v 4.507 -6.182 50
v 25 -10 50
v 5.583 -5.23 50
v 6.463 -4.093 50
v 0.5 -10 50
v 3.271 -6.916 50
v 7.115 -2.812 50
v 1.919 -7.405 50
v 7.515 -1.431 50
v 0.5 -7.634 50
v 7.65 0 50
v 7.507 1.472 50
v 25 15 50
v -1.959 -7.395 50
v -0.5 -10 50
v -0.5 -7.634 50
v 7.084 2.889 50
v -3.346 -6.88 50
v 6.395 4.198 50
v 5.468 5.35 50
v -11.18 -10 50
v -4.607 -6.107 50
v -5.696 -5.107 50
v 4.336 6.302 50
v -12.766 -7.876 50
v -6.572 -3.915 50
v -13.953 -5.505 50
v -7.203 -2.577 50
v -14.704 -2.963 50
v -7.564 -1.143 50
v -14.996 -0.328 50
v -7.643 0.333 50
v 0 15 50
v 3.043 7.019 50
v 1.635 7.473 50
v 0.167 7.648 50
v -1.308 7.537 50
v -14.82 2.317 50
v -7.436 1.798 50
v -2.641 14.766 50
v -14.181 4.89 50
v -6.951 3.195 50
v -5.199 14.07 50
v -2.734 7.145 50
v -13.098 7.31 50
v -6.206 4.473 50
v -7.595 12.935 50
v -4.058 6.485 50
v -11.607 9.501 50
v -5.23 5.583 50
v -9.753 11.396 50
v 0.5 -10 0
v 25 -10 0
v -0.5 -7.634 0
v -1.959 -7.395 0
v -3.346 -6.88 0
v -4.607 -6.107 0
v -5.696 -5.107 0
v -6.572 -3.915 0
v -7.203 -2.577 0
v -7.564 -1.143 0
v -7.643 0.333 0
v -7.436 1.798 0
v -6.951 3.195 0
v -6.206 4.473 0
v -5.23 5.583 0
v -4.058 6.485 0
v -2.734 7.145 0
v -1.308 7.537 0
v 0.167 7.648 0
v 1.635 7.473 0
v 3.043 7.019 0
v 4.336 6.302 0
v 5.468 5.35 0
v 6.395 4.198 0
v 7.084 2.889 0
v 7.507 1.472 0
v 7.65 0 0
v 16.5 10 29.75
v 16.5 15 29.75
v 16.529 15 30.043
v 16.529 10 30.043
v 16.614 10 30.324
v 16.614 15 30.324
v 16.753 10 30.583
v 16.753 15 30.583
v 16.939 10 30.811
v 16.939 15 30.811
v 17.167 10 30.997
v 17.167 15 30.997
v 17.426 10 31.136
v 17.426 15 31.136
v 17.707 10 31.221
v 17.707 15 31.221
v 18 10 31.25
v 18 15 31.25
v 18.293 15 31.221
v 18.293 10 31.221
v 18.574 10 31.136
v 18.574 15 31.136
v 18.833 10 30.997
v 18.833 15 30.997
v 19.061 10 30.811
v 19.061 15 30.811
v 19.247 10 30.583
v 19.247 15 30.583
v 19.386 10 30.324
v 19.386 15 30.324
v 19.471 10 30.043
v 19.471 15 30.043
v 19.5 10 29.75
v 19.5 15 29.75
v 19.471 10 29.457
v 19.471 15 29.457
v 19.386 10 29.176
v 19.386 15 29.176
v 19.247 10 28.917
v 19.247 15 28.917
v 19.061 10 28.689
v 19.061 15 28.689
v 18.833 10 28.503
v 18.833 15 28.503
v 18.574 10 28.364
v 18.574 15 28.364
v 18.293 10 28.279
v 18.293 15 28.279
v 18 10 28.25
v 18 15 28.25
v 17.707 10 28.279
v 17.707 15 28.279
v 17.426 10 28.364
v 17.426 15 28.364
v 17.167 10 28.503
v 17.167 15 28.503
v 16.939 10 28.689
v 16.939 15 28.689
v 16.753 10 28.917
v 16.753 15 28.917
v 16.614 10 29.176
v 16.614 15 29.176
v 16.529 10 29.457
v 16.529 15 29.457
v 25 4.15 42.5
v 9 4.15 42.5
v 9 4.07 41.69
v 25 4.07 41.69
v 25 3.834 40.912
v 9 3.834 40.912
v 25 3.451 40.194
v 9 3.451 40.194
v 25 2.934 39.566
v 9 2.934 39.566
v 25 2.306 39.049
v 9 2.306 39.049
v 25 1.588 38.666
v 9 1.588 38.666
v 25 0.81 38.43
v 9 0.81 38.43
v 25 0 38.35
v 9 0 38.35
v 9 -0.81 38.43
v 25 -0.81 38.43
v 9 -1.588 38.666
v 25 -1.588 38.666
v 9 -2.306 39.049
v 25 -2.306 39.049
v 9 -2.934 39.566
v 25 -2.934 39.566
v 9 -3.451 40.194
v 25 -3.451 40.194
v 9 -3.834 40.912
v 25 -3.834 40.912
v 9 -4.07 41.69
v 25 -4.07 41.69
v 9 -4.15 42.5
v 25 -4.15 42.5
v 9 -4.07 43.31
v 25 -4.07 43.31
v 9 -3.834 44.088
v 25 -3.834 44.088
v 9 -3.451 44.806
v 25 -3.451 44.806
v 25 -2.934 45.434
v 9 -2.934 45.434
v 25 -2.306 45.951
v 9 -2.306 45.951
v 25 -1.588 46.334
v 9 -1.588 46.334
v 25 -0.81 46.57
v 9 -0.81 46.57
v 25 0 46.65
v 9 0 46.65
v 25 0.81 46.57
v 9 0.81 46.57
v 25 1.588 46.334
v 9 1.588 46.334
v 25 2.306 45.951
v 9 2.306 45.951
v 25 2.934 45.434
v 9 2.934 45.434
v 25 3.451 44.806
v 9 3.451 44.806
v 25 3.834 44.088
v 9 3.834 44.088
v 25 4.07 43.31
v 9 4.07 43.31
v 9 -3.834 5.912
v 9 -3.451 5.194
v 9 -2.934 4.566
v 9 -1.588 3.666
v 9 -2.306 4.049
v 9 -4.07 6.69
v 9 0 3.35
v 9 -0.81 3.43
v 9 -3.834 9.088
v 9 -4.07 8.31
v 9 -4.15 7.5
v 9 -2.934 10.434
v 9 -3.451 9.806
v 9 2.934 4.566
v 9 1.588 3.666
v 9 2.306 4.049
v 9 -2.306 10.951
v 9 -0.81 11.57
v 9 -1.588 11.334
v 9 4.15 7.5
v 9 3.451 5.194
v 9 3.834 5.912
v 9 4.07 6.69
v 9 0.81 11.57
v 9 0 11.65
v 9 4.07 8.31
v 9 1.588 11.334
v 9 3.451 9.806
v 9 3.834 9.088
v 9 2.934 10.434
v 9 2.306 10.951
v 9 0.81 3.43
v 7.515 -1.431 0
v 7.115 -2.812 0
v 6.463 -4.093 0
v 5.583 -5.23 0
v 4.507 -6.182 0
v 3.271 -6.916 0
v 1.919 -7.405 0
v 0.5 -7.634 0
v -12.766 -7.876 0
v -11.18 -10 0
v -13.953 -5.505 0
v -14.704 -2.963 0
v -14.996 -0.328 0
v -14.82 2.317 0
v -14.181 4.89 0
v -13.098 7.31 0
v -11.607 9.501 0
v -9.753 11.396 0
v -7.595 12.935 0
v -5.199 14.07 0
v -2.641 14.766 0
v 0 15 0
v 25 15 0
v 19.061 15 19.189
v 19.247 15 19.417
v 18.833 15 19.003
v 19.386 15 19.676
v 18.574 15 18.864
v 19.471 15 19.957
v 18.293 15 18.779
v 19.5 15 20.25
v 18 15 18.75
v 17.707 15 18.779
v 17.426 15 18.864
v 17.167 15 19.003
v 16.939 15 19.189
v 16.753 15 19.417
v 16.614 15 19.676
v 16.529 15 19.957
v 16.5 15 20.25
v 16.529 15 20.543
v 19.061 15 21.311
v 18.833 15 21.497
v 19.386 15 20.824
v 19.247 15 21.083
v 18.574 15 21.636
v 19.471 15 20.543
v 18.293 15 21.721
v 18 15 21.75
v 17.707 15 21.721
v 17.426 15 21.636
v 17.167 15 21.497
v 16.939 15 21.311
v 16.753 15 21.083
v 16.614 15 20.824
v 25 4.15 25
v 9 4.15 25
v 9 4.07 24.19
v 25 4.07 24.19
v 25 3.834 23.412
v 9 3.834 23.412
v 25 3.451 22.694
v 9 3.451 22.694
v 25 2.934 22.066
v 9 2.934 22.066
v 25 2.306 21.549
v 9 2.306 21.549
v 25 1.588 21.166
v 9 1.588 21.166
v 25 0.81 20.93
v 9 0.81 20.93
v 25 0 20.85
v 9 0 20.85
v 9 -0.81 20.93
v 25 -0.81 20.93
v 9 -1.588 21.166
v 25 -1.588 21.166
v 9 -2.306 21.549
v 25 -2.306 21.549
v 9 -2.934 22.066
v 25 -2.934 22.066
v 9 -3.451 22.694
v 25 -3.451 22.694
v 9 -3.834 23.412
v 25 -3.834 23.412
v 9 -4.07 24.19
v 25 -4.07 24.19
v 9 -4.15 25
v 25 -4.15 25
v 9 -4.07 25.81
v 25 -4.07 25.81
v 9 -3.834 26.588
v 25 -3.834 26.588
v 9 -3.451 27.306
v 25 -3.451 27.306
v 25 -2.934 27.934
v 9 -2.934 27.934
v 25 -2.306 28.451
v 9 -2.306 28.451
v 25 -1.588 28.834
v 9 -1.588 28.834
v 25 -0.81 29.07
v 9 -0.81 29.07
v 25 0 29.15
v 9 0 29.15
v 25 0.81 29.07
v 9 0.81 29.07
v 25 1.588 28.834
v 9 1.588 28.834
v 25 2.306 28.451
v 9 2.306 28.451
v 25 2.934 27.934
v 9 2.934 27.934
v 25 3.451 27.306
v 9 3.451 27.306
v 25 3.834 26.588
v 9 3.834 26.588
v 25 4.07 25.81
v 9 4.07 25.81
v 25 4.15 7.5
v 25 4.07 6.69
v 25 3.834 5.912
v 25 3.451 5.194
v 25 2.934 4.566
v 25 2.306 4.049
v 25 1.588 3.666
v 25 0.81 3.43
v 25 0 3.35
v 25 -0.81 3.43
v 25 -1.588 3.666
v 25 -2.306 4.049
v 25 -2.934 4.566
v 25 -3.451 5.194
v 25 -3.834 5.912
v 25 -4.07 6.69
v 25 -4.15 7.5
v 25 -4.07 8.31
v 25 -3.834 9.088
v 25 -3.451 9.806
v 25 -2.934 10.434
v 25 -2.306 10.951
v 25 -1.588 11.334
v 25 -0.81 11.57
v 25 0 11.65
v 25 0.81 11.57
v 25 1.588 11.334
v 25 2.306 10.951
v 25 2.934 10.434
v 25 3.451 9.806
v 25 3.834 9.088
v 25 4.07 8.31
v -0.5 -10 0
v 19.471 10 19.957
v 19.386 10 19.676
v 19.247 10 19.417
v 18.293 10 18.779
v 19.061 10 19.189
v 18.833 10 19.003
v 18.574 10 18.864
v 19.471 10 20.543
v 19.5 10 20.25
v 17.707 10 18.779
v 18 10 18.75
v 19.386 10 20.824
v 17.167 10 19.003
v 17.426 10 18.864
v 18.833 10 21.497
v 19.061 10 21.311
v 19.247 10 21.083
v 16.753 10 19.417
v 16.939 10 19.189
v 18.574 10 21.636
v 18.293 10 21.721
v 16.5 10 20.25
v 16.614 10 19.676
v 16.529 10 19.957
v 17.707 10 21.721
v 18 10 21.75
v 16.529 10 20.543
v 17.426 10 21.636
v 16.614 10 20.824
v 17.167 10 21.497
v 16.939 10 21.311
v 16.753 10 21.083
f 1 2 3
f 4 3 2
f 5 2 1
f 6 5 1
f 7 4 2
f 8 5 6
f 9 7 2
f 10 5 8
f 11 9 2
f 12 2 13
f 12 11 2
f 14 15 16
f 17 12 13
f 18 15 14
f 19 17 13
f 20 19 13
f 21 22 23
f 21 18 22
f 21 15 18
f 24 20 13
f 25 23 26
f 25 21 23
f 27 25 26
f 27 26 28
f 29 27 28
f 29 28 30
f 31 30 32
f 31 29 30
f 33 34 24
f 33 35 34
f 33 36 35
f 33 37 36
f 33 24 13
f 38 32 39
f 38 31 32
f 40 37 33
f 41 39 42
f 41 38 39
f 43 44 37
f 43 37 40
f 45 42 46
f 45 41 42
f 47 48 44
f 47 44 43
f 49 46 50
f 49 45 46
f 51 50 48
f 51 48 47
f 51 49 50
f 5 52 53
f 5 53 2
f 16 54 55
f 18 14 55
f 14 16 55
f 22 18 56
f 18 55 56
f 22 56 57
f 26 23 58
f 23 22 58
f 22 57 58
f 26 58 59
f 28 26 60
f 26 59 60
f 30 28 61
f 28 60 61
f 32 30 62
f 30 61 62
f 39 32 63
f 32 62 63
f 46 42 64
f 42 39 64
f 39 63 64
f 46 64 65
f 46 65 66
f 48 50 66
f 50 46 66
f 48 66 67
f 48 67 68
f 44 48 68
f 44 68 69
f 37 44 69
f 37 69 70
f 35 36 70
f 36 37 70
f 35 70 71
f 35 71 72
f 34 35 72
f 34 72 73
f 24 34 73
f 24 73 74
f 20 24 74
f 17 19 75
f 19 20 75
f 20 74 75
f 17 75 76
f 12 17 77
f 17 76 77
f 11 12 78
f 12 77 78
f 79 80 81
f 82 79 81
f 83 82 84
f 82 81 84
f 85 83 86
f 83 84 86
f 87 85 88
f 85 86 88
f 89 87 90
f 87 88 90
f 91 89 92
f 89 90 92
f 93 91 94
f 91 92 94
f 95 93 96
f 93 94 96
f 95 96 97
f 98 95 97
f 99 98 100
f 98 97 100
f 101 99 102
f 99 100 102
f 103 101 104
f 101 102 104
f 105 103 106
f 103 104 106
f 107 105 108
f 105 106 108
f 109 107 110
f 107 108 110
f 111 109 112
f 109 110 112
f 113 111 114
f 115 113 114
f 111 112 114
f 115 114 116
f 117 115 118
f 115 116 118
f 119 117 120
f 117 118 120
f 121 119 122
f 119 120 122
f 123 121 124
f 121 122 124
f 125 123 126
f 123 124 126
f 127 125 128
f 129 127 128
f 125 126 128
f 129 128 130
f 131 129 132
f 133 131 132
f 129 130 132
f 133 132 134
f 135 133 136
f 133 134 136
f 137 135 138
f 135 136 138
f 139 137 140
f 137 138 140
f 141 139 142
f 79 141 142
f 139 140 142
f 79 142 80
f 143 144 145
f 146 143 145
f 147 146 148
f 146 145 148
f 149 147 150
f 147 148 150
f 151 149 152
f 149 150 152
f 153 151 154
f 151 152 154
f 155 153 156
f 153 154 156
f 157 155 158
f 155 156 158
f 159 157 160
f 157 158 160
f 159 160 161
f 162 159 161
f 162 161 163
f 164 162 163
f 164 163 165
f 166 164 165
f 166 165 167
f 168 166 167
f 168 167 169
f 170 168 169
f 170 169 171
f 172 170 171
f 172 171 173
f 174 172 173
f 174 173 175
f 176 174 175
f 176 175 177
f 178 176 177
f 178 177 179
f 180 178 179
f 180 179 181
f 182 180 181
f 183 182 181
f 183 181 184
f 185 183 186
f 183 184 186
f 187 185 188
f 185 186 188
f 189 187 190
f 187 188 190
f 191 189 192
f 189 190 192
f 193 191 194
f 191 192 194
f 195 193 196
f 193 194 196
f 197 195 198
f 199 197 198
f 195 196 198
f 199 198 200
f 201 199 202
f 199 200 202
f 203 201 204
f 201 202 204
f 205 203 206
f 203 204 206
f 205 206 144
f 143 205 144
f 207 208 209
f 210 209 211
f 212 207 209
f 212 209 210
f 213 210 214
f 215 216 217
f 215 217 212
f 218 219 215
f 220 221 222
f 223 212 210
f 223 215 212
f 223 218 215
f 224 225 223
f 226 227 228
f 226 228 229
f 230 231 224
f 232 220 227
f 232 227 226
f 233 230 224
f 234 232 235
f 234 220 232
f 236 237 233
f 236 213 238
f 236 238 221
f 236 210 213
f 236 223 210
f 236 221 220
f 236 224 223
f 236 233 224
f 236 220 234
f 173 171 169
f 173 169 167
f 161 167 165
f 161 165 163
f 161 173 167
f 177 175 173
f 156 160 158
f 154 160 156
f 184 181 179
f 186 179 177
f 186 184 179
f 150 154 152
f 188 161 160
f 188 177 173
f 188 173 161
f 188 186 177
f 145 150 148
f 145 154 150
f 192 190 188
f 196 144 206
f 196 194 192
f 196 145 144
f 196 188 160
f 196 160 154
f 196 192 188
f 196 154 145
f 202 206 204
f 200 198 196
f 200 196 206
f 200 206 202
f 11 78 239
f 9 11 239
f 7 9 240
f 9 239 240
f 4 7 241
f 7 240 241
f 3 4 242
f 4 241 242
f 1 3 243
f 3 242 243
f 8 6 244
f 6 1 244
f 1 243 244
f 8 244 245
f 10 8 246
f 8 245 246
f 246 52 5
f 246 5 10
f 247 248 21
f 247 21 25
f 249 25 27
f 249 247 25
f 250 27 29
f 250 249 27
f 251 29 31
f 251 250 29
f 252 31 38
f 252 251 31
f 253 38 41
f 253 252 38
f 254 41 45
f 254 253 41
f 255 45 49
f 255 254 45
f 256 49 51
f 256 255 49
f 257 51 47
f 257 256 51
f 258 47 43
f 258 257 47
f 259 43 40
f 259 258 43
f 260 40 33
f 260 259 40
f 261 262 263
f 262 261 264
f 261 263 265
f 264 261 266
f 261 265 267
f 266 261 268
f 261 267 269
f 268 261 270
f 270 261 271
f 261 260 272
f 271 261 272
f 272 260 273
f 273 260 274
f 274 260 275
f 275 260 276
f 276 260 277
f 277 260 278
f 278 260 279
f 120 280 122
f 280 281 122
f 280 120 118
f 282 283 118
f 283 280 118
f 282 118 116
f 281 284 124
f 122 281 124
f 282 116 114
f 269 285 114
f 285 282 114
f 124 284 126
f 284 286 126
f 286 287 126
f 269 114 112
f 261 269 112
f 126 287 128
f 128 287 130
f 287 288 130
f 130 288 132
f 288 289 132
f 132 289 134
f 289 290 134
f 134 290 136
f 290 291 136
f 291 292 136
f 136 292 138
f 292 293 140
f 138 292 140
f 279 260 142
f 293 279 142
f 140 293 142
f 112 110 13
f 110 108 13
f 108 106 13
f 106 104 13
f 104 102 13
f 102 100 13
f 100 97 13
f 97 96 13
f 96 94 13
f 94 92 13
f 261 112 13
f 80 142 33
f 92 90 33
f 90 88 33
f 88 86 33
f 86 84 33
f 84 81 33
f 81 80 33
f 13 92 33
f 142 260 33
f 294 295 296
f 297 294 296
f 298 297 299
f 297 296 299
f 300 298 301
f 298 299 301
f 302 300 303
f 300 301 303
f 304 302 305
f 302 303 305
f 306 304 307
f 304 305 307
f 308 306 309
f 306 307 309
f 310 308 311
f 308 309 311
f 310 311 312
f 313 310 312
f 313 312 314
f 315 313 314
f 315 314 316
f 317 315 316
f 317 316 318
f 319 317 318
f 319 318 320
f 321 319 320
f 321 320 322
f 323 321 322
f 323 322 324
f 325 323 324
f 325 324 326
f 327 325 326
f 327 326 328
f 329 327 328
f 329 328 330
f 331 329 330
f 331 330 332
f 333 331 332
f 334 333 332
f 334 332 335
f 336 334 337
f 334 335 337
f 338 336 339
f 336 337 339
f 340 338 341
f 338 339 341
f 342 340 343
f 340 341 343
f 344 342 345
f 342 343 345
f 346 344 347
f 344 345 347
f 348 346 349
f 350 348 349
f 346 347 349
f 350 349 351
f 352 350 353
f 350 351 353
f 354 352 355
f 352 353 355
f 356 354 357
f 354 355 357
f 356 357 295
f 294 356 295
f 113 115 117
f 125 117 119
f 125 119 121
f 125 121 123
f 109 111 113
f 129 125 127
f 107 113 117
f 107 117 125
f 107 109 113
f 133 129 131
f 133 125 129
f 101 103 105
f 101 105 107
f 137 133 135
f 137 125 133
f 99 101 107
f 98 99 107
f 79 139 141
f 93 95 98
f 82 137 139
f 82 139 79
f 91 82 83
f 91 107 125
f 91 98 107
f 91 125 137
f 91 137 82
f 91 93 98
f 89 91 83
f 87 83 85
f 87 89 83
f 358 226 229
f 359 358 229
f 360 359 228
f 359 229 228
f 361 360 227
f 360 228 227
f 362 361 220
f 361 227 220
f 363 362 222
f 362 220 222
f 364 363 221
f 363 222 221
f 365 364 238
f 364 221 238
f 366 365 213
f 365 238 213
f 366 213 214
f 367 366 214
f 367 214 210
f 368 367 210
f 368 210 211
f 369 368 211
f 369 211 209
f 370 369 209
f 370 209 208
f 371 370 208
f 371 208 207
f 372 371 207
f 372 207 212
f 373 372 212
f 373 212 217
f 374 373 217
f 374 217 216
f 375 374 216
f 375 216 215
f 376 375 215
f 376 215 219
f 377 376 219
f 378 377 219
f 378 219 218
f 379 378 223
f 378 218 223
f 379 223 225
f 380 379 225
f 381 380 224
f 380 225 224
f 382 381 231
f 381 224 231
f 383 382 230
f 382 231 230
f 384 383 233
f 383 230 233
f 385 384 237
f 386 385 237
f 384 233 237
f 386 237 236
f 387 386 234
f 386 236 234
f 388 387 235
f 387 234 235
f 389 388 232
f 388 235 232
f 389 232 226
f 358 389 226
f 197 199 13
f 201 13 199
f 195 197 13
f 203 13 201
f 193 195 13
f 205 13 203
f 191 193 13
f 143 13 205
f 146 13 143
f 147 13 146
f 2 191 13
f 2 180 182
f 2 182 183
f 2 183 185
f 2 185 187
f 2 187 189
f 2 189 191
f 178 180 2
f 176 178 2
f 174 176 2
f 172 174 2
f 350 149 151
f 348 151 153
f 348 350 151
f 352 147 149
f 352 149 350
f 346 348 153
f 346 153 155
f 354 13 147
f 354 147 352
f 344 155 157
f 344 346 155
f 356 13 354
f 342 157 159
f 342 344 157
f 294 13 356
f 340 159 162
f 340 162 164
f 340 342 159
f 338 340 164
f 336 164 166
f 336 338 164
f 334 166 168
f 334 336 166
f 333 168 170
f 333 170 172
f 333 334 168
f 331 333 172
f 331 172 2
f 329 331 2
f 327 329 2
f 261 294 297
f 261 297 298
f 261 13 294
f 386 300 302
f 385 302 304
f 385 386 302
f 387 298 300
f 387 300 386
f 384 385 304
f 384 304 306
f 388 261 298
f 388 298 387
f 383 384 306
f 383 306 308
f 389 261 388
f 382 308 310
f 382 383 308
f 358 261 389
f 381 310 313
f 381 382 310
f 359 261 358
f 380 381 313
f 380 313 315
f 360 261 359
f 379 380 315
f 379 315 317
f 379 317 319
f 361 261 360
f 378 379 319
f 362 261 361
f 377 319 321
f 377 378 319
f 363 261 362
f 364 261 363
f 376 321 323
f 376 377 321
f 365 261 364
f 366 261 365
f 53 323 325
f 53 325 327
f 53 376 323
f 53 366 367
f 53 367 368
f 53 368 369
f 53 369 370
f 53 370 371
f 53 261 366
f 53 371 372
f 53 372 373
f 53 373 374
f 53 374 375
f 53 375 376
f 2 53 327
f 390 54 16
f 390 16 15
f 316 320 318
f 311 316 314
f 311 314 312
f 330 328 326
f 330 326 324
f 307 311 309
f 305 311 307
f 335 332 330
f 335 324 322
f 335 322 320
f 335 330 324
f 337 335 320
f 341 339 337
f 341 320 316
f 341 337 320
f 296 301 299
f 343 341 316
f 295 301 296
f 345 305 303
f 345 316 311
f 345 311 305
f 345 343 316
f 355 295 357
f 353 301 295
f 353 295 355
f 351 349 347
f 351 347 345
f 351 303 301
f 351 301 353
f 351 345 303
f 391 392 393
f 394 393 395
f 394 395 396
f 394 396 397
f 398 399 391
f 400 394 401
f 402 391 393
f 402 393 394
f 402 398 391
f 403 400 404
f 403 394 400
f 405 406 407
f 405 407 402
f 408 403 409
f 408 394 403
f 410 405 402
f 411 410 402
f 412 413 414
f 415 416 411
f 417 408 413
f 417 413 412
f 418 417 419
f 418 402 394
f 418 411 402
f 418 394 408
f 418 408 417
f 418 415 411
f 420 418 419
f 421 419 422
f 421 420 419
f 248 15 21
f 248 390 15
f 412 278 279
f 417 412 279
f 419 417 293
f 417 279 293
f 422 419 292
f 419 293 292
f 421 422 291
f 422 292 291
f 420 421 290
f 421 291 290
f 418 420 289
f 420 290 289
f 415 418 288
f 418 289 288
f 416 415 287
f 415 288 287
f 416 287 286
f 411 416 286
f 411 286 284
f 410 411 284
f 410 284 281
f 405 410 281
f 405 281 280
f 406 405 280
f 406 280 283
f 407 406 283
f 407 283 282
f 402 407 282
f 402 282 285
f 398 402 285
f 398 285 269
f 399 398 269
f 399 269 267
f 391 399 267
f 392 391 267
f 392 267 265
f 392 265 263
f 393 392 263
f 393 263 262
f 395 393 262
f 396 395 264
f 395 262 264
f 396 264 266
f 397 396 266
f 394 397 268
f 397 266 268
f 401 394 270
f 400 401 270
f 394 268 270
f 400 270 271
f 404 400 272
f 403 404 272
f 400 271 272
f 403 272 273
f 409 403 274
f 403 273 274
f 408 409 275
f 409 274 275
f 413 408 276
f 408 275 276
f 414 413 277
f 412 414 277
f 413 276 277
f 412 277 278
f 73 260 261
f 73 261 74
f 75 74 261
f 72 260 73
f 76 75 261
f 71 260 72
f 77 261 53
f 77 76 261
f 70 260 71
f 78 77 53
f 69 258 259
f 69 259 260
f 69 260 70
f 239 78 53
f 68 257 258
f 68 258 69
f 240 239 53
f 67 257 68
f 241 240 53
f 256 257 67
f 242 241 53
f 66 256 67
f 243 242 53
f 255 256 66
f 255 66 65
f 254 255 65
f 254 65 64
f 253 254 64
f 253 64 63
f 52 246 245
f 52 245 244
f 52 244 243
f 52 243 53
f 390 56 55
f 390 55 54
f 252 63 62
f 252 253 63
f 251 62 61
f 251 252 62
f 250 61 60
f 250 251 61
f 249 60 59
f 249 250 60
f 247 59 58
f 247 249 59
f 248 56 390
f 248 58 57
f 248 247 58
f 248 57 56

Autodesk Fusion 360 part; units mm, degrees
sketch "Skizze1" plane through (0, 0, 0) normal (0, 0, 1) x (1, 0, 0)
  circle A0 centre (0, 0) radius 7.65
  line L0 (15, -10) -> (-15, -10)
  line L1 (-15, -10) -> (-15, 15)
  line L2 (-15, 15) -> (15, 15)
  line L3 (15, 15) -> (15, -10)
  line L4 (0, 0) -> (0, -10)
  line L5 (0, -10) -> (-0.5, -10)
  line L6 (-0.5, -10) -> (0.5, -10)
  line L7 (0.5, -10) -> (0.5, -7.3)
  line L8 (0.5, -7.3) -> (-0.5, -7.3)
  line L9 (-0.5, -7.3) -> (-0.5, -10)
  circle A1 centre (0, 0) radius 15
  dimension "d1" = 15.3
  dimension "d4" = 15
  dimension "d5" = 10
  dimension "d6" = 15
  dimension "d7" = 25
extrude "Extrusion1" add sketch "Skizze1" along normal blind 50 contours A0 L0 L7 L9 A1 | L0 L3 A1 | L2 L3 A1
sketch "Skizze2" plane through (15, 0, 0) normal (1, 0, 0) x (0, 1, 0)
  line L0 (-10, 0) -> (15, 0)
  line L1 (15, 0) -> (15, 50)
  line L2 (15, 50) -> (-10, 50)
  line L3 (-10, 50) -> (-10, 0)
  line L4 (-10, 25) -> (15, 25)
  circle A0 centre (0, 25) radius 4.15
  line L5 (0, 25) -> (0, 42.5)
  line L6 (0, 25) -> (0, 7.5)
  circle A1 centre (0, 42.5) radius 4.15
  circle A2 centre (0, 7.5) radius 4.15
  dimension "d10" = 8.3
  dimension "d11" = 10
  dimension "d22" = 17.5
  dimension "d23" = 8.3
  dimension "d24" = 8.3
  dimension "d25" = 17.5
extrude "Extrusion2" cut sketch "Skizze2" against normal blind 6 contours A2 | A1 | L4 A0 L5 | L4 A0 L6 | L4 A0 L6 | L4 A0 L5
extrude "Extrusion4" add 1 faces at (15, 11.3833, 25) along direction (1, 0, 0) blind 10
sketch "Skizze3" plane through (0, 15, 0) normal (0, 1, 0) x (-1, 0, 0)
  line L0 (-25, 0) -> (0, 0)
  line L1 (0, 50) -> (-25, 50)
  line L2 (-25, 25) -> (-18, 25)
  line L3 (-18, 25) -> (-18, 20.25)
  line L4 (-18, 25) -> (-18, 29.75)
  circle A0 centre (-18, 29.75) radius 1.5
  circle A1 centre (-18, 20.25) radius 1.5
  line L5 (0, 0) -> (0, 50)
  line L6 (-25, 50) -> (-25, 0)
  dimension "d15" = 7
  dimension "d16" = 4.75
  dimension "d17" = 4.75
  dimension "d18" = 3
  dimension "d19" = 3
extrude "Extrusion3" cut sketch "Skizze3" against normal blind 5 contours A0 | A1
